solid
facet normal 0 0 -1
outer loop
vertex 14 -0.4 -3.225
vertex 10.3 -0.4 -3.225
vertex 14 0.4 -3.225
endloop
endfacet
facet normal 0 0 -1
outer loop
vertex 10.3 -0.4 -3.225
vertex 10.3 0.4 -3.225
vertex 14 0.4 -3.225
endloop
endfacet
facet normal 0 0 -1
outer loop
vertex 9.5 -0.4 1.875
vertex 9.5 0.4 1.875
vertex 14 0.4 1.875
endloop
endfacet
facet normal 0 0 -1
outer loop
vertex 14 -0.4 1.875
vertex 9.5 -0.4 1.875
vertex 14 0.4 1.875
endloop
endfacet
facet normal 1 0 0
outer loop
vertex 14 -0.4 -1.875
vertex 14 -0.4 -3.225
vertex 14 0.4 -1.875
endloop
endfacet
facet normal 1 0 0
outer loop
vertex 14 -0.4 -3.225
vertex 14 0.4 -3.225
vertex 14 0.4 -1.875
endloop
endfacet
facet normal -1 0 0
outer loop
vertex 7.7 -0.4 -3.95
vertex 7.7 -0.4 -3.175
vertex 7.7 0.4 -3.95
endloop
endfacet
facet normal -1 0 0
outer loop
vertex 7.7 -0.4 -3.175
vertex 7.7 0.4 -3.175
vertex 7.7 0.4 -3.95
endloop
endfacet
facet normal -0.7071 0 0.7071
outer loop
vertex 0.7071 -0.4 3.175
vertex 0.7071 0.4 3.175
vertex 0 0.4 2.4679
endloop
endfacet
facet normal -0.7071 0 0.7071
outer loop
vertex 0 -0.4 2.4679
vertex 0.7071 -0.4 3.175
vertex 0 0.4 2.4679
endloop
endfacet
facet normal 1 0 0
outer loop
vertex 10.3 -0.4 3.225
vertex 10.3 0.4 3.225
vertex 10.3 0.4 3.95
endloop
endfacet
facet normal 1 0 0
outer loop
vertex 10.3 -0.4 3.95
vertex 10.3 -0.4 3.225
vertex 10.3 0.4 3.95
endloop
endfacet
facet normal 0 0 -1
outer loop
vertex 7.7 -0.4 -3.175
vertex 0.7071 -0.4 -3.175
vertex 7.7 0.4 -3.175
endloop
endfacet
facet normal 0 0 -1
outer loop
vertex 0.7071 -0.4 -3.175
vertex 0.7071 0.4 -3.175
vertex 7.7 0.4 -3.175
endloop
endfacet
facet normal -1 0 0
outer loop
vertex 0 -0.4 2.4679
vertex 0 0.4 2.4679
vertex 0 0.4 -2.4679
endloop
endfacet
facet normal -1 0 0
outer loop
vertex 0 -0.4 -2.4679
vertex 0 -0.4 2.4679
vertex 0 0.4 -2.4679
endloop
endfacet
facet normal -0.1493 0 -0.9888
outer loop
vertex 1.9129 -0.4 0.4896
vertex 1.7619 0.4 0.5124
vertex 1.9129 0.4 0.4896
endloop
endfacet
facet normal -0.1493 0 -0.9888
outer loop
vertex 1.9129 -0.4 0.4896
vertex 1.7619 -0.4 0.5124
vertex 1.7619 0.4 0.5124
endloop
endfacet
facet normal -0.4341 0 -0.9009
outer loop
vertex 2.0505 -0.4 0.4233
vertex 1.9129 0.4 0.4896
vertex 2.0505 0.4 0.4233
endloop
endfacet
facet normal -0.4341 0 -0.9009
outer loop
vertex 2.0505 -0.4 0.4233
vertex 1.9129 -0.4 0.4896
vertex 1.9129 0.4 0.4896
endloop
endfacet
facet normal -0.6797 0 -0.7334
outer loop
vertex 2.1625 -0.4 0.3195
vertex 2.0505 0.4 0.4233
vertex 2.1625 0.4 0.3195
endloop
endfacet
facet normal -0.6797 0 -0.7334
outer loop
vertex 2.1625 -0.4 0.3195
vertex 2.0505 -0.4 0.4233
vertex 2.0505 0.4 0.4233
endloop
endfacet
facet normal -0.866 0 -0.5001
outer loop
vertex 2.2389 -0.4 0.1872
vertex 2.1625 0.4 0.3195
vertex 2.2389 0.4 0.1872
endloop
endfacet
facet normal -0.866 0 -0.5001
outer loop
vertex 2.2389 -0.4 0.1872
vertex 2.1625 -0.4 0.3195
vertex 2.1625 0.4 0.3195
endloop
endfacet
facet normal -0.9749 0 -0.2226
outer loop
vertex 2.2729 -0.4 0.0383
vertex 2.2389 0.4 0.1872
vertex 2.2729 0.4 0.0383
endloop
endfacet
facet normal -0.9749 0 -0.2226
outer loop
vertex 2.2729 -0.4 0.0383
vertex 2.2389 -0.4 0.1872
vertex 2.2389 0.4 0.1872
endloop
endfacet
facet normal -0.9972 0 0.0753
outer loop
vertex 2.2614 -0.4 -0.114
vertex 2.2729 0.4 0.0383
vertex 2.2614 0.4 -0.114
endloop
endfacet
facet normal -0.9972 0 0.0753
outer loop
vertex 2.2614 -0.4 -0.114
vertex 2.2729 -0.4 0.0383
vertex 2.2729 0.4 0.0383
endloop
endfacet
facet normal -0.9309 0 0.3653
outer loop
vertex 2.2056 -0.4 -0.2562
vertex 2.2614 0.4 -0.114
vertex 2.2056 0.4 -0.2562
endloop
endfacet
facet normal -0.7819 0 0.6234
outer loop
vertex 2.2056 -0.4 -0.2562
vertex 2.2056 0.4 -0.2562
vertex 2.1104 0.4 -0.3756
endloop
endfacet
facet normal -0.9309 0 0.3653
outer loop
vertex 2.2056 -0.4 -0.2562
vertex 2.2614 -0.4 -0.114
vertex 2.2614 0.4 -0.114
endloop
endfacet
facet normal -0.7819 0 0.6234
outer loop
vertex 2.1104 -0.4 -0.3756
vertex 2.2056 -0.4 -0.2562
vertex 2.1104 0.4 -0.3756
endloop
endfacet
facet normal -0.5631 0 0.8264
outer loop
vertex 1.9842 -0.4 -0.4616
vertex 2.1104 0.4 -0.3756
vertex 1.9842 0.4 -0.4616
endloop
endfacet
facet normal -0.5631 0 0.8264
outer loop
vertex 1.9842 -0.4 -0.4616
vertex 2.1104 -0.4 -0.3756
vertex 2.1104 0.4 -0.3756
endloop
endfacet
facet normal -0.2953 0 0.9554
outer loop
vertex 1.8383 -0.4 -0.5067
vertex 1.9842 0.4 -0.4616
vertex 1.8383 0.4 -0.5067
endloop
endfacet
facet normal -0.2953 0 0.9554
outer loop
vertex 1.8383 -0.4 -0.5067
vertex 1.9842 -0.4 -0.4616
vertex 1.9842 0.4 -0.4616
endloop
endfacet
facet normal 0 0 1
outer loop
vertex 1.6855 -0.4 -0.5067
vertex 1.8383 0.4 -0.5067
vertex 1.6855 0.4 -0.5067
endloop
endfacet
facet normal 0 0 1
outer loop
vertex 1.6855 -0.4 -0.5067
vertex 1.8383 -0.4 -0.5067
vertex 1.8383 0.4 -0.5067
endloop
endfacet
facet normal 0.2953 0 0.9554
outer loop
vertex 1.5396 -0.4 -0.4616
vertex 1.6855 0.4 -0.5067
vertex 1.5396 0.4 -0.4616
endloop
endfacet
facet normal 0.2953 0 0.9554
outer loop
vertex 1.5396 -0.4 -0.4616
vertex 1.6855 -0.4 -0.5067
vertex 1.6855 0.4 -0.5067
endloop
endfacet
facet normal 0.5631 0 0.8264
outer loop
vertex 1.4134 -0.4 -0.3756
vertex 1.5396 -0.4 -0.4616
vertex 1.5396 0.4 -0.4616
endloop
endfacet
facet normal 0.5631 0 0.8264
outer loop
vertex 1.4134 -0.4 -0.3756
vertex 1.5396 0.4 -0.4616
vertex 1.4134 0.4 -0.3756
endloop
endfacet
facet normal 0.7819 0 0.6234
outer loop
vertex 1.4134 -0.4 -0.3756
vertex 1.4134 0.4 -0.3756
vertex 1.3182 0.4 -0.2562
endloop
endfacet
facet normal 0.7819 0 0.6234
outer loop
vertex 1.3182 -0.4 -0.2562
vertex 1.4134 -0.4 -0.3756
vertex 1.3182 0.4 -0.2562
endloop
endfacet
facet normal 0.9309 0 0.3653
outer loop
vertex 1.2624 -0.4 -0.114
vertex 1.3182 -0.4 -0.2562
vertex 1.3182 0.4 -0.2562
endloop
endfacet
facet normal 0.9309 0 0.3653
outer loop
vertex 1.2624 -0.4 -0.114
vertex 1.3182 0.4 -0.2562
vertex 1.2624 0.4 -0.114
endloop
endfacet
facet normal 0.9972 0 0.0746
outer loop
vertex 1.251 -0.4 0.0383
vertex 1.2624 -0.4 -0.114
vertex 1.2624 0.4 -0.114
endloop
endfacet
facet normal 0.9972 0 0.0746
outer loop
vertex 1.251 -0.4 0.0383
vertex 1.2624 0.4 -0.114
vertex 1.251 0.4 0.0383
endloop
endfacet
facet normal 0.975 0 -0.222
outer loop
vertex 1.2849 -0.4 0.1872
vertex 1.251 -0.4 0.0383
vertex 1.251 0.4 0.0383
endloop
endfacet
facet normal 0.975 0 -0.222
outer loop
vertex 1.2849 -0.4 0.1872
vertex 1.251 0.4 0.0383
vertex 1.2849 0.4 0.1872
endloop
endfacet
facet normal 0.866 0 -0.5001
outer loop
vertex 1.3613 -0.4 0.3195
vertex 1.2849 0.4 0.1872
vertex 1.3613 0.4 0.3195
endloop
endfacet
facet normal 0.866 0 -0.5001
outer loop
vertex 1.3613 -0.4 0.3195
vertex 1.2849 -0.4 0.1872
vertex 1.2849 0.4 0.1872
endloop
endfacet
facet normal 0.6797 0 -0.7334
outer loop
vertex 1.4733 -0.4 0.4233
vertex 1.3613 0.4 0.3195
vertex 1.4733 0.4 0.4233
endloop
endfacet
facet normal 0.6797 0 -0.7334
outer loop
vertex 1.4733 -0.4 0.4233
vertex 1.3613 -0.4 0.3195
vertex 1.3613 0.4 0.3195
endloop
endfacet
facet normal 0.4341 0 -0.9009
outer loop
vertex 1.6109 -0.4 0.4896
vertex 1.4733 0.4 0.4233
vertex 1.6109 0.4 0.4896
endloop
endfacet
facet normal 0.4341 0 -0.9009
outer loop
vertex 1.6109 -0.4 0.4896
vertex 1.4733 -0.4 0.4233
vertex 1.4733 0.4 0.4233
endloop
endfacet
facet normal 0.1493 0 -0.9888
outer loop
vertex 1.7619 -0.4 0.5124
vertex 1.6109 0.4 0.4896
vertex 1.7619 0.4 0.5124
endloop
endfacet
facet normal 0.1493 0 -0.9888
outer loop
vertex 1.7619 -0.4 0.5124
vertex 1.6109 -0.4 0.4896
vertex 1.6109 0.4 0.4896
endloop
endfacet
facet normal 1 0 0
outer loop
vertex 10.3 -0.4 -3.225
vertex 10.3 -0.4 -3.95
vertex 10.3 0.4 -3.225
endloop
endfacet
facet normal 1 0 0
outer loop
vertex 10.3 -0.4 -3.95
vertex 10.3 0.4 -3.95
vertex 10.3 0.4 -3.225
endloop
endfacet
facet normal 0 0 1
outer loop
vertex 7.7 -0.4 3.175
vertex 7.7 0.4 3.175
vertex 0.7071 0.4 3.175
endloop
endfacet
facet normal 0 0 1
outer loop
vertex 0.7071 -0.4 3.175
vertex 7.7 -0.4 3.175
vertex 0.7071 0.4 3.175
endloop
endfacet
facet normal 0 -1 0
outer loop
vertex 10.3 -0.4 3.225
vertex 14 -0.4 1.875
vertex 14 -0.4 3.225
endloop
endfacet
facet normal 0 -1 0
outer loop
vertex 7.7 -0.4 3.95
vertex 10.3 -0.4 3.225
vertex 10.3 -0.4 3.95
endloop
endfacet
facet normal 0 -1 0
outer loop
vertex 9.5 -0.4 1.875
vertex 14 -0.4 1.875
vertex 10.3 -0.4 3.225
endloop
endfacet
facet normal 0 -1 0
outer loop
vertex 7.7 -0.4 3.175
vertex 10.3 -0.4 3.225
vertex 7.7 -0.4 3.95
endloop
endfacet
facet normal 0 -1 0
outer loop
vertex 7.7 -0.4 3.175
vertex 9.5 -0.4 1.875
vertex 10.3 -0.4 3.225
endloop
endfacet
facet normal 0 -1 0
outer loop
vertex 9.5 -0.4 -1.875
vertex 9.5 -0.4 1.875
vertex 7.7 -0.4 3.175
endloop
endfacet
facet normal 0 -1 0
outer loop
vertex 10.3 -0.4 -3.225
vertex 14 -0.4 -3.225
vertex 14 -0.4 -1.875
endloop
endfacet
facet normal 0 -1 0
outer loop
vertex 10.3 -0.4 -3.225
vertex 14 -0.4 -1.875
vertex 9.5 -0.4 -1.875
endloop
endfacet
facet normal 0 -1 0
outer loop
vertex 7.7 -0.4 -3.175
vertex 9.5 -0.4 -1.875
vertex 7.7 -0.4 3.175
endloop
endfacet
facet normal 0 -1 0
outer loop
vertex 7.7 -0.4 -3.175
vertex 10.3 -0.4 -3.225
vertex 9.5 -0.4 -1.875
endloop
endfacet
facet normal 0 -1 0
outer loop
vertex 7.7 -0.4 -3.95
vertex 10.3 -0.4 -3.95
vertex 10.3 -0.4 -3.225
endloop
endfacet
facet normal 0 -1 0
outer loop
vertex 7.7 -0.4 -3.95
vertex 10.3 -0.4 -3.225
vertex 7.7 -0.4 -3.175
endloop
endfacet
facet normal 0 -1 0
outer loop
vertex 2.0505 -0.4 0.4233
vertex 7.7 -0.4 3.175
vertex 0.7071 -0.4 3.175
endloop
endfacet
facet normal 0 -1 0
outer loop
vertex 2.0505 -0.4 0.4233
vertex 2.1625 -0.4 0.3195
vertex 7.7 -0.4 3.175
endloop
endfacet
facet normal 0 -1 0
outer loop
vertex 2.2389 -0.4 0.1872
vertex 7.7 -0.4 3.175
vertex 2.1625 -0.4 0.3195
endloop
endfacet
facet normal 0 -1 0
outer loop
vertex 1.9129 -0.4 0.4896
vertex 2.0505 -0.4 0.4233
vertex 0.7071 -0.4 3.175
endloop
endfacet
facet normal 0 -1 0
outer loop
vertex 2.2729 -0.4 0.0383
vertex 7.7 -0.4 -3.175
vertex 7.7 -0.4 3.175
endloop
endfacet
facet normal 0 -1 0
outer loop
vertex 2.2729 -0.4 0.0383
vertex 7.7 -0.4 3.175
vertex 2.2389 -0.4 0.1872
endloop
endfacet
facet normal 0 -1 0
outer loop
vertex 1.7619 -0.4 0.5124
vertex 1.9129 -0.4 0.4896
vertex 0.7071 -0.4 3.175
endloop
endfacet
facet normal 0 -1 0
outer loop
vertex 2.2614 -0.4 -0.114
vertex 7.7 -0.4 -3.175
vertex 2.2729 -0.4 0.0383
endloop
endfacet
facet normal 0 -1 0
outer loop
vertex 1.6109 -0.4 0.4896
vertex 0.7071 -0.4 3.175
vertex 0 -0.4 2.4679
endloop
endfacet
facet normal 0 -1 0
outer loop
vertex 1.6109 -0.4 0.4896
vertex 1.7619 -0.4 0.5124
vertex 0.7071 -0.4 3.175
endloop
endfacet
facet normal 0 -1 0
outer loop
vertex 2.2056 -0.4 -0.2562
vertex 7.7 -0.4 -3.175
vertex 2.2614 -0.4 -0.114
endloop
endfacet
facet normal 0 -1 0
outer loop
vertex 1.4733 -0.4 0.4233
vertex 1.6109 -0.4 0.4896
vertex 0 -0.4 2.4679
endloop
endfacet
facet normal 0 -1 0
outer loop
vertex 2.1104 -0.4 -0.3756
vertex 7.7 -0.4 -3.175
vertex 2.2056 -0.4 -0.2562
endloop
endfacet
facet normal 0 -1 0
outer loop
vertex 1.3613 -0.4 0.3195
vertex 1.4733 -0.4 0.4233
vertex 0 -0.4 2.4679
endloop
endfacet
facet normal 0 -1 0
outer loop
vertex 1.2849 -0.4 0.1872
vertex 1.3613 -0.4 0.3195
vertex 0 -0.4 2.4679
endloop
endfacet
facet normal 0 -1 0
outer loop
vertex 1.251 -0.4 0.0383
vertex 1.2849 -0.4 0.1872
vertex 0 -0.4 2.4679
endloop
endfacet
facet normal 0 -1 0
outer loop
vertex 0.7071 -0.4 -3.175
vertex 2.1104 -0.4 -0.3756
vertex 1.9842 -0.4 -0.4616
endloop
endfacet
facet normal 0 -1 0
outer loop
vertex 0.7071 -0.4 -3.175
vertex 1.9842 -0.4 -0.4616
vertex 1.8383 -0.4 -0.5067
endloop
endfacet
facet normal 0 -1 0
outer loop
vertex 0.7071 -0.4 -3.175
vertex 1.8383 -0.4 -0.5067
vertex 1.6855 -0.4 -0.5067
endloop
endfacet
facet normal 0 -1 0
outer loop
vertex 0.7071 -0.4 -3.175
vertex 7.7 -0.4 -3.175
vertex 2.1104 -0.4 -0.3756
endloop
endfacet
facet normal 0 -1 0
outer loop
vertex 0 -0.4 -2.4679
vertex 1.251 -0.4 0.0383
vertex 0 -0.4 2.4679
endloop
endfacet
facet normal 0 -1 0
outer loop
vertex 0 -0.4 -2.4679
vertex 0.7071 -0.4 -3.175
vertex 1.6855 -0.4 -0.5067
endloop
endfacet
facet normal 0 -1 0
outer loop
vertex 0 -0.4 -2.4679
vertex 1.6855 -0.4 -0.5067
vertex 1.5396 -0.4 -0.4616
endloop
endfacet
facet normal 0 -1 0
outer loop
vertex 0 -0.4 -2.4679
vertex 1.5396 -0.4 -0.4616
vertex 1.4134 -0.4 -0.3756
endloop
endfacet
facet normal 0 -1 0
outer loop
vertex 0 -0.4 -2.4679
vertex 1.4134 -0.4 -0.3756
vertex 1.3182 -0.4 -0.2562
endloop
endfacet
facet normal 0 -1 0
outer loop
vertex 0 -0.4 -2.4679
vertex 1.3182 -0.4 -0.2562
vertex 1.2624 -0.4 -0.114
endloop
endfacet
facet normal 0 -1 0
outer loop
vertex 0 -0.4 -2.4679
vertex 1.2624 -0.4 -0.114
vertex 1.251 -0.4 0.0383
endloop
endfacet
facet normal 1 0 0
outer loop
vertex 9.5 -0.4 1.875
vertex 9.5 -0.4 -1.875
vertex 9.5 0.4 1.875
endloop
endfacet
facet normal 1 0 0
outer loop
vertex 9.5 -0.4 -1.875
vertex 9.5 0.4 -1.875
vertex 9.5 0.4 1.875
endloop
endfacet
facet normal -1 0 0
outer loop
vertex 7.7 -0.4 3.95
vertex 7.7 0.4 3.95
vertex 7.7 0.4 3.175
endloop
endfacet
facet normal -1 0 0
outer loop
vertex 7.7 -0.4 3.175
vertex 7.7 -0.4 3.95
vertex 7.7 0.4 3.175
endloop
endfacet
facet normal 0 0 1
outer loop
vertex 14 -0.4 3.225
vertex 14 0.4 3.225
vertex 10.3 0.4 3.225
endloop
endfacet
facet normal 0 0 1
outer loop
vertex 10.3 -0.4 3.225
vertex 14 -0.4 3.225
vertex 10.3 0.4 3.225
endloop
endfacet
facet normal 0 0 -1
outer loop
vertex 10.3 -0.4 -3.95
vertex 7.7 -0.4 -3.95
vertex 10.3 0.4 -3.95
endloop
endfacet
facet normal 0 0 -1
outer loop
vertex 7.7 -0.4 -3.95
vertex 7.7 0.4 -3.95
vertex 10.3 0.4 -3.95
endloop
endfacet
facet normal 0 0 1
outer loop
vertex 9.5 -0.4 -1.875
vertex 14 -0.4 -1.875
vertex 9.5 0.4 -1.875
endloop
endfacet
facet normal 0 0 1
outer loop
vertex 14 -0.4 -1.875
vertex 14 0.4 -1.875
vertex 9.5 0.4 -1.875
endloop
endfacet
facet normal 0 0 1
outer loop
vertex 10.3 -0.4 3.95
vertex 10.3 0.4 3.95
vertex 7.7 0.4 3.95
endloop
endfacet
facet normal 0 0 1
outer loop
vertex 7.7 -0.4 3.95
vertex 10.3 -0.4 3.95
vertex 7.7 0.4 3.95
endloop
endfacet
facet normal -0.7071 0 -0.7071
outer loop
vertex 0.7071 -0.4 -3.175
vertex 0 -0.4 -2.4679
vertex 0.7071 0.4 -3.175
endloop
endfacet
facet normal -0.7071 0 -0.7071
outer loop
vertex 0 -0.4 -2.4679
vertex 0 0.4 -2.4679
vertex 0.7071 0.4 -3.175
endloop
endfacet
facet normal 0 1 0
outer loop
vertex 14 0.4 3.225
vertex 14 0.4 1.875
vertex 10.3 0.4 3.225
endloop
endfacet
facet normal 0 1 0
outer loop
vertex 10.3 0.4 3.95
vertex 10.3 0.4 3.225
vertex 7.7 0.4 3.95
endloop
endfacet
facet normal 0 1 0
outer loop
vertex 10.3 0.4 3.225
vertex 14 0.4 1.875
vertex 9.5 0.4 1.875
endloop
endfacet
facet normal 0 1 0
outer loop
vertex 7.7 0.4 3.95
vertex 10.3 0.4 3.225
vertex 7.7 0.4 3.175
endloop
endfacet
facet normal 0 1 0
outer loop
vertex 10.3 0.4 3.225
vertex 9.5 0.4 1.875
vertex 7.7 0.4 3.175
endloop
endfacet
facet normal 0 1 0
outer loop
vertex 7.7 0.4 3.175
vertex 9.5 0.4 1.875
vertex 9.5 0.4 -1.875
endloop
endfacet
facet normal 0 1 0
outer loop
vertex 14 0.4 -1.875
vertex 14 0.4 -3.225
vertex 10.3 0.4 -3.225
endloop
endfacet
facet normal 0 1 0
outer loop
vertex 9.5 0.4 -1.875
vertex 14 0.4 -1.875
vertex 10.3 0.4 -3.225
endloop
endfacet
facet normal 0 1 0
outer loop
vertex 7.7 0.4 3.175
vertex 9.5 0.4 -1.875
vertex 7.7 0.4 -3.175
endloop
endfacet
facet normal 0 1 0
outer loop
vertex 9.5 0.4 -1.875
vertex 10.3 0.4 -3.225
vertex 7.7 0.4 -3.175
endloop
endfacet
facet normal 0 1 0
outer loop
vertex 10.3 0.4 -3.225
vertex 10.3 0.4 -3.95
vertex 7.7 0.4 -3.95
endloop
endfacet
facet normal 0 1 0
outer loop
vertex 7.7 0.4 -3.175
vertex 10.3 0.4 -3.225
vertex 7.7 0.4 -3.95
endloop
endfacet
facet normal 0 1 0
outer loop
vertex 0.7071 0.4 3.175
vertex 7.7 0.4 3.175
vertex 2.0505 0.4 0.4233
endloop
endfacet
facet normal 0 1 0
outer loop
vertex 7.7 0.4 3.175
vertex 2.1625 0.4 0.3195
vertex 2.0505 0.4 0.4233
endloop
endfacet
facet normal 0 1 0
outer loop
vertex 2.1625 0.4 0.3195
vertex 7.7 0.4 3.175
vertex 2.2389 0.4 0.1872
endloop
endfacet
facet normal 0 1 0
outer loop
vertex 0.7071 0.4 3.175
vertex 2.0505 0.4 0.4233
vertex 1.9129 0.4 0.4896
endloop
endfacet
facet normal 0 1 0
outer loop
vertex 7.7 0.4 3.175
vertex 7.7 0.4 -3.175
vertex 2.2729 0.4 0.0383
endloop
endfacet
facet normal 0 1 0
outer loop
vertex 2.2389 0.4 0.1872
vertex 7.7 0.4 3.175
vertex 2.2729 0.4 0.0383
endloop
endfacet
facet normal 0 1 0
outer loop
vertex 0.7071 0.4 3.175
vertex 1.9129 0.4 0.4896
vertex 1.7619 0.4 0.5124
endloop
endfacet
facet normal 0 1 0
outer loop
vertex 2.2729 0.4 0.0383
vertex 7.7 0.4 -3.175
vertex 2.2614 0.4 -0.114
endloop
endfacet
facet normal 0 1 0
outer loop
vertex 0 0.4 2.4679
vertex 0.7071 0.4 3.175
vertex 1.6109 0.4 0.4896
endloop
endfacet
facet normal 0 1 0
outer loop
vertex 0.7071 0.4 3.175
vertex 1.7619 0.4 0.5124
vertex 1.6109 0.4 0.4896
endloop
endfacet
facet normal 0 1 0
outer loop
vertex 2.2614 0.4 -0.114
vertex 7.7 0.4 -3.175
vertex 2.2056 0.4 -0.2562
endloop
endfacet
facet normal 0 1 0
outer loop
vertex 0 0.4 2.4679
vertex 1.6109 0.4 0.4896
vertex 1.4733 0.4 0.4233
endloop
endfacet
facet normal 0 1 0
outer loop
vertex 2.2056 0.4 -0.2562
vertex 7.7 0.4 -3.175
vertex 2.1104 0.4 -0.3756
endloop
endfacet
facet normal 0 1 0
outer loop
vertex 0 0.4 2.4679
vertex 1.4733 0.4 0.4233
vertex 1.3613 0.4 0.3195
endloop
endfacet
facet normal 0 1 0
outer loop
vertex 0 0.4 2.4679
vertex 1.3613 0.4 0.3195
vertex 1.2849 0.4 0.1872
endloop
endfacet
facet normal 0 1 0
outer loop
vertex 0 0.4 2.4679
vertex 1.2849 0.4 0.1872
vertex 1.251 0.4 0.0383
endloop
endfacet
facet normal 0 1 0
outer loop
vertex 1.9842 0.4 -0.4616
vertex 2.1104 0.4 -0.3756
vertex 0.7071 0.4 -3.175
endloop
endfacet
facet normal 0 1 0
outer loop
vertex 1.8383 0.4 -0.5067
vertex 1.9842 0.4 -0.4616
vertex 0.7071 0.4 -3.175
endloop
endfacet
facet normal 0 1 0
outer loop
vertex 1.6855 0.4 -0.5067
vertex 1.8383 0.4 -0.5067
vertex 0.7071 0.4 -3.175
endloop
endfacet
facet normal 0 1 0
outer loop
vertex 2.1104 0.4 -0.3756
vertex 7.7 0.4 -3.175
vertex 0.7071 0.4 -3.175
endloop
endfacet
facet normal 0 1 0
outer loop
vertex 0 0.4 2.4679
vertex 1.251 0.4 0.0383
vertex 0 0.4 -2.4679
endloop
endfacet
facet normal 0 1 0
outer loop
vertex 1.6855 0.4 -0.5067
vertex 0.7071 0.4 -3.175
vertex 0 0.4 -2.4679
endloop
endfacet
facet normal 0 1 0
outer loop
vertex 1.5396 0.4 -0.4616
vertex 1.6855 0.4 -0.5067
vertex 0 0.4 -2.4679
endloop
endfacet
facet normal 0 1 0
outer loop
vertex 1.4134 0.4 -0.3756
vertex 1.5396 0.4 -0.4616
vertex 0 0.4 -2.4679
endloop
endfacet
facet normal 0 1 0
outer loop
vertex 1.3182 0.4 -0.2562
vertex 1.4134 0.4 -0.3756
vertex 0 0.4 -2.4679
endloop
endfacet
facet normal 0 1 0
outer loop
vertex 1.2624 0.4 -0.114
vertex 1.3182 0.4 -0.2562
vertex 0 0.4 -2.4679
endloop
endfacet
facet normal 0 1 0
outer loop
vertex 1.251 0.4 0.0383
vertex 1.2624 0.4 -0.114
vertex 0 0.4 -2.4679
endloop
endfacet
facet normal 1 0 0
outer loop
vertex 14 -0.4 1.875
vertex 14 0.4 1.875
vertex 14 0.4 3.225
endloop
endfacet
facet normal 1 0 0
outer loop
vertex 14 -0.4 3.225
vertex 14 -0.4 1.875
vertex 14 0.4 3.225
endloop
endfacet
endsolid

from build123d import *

# Parameters (mm, degrees)
SKETCH_1_R      = 0.512380356
EXTRUDE_1_DEPTH = 0.4


with BuildPart() as part:
    # Эскиз1 → Бобышка-Вытянуть1 (new, symmetric)
    with BuildSketch(Plane(origin=(0, 0, 0), x_dir=(1, 0, 0), z_dir=(0, 1, 0))):
        Polygon((0, -2.467893219), (0, 2.467893219), (0.707106781, 3.175), (7.7, 3.175), (7.7, 3.95), (10.3, 3.95), (10.3, 3.225), (14, 3.225), (14, 1.875), (9.5, 1.875), (9.5, -1.875), (14, -1.875), (14, -3.225), (10.3, -3.225), (10.3, -3.95), (7.7, -3.95), (7.7, -3.175), (0.707106781, -3.175), align=None)
        with Locations(Location((1.761903111, 0, 0), (0, 0, 270))):
            Circle(SKETCH_1_R, mode=Mode.SUBTRACT)
    extrude(amount=EXTRUDE_1_DEPTH, both=True)


solid = part.part
